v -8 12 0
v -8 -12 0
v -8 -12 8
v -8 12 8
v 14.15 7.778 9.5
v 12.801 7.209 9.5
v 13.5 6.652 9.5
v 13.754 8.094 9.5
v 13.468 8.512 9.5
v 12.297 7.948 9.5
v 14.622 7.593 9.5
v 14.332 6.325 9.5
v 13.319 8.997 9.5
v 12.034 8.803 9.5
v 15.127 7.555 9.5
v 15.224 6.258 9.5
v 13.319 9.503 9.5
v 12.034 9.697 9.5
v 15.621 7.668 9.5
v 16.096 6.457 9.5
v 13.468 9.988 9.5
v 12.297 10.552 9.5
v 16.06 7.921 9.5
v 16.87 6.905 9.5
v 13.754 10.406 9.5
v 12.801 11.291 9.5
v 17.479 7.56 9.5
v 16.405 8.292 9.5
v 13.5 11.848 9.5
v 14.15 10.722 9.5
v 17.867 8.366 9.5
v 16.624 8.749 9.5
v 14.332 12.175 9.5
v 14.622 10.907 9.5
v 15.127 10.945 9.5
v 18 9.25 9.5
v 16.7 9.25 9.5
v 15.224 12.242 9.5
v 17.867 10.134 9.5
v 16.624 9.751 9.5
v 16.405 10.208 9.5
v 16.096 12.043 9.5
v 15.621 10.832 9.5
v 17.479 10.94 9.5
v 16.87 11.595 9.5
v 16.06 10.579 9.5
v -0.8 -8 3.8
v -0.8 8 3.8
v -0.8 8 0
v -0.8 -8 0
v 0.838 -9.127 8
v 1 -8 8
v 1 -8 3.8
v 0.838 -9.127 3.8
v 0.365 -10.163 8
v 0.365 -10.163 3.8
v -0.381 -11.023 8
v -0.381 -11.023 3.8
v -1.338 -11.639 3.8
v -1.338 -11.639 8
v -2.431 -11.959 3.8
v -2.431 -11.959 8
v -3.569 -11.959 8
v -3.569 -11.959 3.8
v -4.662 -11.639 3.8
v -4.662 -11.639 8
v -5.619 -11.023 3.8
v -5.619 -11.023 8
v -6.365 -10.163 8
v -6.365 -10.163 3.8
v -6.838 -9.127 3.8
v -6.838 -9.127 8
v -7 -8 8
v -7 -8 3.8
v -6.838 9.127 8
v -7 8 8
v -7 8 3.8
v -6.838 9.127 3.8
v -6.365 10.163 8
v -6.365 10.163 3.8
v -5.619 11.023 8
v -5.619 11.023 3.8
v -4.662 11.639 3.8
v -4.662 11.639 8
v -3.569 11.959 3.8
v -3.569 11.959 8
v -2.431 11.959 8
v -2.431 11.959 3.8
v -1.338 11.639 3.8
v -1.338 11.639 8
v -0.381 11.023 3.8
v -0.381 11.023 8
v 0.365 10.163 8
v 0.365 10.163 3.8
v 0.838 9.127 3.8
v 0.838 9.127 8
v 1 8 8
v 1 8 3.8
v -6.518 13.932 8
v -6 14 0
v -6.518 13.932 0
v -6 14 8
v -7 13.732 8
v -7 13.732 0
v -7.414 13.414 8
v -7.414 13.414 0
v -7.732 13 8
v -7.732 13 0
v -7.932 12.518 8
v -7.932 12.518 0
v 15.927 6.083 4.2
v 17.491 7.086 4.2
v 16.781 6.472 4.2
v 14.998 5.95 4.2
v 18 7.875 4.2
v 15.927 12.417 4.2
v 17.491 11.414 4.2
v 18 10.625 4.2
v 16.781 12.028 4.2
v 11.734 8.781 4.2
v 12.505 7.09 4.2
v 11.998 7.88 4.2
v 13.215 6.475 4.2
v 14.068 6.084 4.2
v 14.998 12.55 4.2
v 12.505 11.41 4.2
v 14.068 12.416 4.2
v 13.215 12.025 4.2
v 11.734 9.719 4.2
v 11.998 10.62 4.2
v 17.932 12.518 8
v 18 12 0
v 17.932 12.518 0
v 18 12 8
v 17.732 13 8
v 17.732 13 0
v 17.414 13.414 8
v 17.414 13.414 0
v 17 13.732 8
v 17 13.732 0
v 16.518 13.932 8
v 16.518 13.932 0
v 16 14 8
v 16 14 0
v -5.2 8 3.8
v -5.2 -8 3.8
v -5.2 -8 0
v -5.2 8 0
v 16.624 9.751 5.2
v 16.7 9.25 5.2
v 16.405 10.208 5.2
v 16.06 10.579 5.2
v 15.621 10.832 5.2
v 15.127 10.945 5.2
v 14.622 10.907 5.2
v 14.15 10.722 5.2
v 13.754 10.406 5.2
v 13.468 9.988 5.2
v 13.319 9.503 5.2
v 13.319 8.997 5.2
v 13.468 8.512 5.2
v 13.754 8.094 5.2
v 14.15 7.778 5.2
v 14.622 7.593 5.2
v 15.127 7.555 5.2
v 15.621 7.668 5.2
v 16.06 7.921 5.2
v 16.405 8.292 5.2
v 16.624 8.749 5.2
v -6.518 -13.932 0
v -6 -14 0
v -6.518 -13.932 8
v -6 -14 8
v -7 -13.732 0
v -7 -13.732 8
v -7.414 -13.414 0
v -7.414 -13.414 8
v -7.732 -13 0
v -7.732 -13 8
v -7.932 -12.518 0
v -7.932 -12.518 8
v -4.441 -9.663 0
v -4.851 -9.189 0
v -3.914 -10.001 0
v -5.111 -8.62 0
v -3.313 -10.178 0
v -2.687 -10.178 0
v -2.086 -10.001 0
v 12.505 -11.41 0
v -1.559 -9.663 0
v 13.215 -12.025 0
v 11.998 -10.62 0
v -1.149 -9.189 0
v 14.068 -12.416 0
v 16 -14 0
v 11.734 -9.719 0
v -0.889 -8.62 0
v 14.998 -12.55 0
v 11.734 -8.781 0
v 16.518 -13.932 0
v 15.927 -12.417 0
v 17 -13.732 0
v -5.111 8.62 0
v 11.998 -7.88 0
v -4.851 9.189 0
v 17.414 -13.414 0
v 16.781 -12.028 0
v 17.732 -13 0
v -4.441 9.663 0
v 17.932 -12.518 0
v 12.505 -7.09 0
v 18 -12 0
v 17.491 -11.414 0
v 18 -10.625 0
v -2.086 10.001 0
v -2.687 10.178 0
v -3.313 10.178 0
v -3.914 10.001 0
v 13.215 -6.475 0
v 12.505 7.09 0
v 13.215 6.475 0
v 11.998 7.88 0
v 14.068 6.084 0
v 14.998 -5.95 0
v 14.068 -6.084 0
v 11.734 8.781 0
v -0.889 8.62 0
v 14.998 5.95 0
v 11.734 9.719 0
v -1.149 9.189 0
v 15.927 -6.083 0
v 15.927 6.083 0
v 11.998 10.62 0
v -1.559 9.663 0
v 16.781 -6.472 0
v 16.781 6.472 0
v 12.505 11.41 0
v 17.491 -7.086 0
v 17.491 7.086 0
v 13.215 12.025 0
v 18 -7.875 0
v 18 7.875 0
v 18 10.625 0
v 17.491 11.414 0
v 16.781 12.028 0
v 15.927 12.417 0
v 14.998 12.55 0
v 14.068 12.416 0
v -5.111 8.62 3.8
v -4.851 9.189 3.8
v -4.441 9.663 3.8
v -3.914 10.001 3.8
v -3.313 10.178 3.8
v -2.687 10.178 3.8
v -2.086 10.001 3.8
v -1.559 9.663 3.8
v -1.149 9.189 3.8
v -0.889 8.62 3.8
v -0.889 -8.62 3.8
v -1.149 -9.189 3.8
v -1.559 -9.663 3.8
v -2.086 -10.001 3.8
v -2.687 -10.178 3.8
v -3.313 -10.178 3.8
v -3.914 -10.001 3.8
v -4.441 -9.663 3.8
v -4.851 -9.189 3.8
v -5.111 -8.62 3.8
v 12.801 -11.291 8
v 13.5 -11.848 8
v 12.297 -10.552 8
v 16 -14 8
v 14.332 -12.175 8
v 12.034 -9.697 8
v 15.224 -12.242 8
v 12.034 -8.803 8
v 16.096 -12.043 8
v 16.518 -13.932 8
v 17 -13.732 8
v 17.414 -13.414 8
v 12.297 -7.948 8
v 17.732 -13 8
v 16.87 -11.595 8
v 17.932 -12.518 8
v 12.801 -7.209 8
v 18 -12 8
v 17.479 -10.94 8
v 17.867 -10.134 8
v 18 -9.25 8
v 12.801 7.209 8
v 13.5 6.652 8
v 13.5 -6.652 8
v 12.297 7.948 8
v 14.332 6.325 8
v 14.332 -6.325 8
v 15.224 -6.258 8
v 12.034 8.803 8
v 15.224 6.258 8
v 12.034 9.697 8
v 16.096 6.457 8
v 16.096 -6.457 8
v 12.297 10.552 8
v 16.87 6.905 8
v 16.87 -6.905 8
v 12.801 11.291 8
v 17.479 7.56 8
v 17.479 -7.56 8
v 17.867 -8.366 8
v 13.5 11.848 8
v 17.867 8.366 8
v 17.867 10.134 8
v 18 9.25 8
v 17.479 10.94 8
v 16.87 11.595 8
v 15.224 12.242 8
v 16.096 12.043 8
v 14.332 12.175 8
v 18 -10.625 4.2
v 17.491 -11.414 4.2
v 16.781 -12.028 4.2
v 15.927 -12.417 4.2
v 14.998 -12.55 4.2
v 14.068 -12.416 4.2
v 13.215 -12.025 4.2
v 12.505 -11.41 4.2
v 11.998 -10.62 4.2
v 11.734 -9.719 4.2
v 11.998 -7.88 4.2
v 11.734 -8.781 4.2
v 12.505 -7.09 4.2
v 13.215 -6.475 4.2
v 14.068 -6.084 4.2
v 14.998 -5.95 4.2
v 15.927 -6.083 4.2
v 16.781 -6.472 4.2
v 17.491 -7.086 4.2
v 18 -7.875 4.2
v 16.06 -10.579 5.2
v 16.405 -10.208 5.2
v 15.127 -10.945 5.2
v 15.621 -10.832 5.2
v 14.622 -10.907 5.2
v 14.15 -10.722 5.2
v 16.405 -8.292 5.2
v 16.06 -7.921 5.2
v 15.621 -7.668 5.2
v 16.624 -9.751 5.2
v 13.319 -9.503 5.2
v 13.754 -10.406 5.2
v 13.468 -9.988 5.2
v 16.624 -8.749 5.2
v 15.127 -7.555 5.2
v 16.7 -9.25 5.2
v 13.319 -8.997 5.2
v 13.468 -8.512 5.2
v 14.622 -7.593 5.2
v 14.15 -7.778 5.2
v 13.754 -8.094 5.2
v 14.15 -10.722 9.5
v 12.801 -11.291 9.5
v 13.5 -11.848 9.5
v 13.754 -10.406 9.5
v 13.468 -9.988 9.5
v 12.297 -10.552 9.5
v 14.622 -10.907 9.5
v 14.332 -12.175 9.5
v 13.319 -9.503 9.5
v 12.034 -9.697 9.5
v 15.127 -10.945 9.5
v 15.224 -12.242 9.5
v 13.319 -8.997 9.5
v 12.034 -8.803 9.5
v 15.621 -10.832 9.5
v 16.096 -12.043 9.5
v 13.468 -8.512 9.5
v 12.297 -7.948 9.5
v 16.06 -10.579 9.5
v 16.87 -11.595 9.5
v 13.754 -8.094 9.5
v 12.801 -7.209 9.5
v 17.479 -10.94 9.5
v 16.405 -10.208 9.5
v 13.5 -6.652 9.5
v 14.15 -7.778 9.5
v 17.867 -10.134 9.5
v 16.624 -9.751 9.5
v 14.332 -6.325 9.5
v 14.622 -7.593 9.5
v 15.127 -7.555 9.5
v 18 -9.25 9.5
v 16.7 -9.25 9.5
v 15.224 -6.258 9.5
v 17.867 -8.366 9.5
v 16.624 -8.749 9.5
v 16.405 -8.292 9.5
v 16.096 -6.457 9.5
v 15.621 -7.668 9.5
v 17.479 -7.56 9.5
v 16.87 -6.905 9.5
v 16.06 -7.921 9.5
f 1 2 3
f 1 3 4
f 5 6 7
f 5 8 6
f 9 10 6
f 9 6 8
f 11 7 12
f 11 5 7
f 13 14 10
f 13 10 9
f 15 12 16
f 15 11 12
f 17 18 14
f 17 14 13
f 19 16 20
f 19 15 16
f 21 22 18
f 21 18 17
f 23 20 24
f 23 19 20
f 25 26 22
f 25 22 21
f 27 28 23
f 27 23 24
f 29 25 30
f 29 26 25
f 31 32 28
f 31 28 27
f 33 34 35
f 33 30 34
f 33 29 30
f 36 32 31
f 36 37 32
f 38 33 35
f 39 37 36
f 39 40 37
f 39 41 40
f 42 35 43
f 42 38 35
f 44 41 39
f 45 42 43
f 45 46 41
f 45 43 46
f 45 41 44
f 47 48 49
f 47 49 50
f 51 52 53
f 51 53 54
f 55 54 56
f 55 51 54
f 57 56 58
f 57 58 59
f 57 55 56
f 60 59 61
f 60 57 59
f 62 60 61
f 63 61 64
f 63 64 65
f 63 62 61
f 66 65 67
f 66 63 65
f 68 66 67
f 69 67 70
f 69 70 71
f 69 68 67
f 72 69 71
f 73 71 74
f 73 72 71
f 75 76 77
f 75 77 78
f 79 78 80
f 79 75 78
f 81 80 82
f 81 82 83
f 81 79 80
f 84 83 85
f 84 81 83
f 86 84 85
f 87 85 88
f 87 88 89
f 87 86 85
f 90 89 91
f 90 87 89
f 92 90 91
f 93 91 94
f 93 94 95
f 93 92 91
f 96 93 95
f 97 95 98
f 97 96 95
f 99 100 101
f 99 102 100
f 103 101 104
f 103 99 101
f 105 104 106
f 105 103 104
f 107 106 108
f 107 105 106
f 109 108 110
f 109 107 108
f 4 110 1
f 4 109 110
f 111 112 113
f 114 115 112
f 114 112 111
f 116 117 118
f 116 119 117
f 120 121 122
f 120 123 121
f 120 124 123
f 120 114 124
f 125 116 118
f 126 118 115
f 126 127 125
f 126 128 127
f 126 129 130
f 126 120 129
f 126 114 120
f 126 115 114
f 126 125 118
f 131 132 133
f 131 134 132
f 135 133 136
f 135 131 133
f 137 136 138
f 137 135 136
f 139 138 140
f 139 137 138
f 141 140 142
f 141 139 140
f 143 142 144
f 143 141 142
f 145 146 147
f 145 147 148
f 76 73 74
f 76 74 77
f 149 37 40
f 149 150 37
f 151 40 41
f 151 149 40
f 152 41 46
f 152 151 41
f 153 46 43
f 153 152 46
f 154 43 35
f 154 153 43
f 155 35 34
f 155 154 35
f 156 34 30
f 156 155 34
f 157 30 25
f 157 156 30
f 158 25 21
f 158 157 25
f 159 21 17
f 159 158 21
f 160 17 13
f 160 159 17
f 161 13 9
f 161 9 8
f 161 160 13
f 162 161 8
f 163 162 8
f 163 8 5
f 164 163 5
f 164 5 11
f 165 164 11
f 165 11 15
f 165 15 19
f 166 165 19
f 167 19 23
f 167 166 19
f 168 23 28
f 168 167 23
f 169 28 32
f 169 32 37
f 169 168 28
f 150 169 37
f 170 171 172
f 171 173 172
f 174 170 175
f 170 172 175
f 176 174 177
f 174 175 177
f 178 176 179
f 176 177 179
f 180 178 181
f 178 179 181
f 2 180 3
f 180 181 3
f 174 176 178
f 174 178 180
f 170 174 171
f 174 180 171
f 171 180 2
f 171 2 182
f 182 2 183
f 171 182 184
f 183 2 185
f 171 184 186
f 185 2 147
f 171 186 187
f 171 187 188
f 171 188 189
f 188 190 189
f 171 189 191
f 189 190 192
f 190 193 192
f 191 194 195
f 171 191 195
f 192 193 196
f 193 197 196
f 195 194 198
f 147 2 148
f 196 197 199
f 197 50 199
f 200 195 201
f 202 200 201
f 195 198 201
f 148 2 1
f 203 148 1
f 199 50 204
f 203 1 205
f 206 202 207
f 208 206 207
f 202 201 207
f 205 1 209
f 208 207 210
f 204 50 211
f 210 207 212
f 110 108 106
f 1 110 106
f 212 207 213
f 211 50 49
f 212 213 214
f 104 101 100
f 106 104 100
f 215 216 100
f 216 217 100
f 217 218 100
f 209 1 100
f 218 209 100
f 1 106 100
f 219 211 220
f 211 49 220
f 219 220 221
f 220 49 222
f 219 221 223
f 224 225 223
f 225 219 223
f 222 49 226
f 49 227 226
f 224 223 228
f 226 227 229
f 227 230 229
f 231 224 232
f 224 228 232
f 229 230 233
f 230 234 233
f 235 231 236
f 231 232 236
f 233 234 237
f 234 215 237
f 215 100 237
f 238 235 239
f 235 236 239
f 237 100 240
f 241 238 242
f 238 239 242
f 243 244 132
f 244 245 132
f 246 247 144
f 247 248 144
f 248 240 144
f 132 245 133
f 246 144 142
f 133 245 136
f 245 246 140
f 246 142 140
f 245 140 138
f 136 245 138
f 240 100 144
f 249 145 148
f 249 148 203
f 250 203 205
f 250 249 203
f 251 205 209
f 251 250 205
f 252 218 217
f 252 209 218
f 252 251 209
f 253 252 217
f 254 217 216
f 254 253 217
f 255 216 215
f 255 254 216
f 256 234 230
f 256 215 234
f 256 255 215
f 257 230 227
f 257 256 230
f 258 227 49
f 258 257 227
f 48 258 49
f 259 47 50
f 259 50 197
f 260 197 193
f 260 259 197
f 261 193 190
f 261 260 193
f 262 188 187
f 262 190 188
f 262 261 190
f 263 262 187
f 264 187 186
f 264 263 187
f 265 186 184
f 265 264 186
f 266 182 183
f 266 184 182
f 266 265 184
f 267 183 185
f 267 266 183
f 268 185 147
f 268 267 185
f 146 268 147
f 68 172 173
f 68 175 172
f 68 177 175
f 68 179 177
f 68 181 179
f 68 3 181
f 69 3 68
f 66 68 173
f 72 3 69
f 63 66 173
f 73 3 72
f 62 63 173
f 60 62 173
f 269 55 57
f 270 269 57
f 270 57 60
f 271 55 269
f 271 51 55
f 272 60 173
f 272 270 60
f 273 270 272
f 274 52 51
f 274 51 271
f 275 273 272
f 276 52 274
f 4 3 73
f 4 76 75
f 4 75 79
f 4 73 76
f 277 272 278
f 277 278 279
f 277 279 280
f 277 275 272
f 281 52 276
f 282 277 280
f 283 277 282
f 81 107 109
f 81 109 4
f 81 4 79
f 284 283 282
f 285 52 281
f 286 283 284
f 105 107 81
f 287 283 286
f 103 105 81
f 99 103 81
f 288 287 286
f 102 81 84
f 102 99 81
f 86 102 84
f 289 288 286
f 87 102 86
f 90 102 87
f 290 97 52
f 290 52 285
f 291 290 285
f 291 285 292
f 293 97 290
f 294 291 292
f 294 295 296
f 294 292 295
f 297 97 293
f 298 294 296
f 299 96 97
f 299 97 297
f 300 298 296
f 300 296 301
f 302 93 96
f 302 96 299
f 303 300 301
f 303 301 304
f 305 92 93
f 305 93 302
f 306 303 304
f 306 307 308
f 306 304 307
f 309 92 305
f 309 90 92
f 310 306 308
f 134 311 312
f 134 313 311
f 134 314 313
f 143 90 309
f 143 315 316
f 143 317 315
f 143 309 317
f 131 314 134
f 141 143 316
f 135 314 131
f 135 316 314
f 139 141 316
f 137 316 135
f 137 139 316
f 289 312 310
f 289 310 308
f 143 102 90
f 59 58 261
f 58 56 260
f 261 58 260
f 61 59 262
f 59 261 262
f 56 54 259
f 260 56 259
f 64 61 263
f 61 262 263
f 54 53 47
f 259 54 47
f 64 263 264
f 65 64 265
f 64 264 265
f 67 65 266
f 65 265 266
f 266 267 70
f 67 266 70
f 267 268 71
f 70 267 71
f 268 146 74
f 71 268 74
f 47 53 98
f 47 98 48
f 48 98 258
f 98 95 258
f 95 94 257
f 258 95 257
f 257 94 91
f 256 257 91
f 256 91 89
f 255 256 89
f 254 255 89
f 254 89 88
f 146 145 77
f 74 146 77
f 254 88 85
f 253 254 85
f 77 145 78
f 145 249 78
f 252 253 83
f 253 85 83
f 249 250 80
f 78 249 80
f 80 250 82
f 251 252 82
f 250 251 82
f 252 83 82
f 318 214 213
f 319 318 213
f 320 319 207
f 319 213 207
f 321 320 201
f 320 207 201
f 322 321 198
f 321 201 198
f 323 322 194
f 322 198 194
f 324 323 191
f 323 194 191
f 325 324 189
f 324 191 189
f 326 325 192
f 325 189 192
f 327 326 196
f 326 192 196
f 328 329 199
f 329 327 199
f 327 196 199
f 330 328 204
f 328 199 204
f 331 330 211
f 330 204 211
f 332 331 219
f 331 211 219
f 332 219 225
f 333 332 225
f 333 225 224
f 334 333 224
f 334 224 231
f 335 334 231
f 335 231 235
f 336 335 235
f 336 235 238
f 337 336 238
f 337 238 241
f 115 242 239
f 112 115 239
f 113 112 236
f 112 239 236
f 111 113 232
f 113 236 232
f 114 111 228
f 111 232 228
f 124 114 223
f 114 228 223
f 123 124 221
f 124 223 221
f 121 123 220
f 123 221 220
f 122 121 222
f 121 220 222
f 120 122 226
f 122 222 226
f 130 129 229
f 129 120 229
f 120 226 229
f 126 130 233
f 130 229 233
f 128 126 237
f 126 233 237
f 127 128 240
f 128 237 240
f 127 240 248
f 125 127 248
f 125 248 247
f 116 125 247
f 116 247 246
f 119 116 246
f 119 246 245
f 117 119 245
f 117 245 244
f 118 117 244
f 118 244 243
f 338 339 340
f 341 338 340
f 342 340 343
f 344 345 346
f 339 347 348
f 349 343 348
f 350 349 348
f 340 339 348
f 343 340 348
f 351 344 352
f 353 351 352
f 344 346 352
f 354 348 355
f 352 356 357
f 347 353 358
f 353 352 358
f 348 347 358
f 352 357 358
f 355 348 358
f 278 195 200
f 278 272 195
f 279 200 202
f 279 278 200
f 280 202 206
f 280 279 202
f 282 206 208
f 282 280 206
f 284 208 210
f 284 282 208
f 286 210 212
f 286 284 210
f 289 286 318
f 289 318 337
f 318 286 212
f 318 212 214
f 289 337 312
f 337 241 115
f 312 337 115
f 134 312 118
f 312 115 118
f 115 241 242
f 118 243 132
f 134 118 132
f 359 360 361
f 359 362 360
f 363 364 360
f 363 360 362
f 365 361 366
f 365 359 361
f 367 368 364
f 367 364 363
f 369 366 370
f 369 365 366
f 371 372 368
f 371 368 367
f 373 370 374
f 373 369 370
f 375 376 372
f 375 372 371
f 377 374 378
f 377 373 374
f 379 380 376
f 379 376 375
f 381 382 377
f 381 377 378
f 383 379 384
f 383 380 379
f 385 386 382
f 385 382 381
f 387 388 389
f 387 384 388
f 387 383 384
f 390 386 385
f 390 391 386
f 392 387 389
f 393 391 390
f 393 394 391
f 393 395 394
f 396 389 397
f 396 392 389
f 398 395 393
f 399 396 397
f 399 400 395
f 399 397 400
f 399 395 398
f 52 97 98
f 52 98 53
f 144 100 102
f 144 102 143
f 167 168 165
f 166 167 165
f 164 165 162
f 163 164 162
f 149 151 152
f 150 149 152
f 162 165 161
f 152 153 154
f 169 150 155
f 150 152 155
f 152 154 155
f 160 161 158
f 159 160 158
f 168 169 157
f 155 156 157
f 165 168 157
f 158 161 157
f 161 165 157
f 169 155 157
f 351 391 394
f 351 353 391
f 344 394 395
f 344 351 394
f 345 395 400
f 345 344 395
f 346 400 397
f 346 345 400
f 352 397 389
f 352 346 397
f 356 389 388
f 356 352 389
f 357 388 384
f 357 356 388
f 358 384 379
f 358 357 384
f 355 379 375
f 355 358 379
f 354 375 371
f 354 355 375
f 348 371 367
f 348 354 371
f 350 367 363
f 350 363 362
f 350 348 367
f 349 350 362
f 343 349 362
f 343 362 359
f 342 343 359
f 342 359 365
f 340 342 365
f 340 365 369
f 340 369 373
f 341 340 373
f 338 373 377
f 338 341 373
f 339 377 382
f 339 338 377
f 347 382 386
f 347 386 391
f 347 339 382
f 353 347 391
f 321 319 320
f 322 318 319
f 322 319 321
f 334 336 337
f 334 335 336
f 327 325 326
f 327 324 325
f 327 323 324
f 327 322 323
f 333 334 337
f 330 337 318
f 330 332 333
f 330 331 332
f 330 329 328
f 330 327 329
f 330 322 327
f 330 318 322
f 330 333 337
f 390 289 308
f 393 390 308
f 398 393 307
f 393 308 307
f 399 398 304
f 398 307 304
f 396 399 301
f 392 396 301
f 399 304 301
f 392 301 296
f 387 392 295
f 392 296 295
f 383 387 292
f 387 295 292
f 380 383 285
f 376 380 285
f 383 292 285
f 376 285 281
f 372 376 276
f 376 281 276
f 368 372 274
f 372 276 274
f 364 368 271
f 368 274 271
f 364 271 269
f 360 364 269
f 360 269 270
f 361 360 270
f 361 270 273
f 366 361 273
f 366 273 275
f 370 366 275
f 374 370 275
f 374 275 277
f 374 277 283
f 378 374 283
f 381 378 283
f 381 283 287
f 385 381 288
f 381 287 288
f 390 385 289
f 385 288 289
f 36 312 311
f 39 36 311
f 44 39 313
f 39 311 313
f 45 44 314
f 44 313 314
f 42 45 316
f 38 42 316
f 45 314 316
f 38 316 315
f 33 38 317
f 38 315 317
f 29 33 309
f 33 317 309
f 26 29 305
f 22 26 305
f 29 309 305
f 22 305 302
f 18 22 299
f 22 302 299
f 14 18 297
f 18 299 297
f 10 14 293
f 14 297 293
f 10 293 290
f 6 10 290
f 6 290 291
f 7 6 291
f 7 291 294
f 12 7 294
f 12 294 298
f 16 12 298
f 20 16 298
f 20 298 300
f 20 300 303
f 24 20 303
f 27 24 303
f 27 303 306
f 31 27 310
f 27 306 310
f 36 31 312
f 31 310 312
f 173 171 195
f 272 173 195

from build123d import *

# Parameters (mm, degrees)
ESQUISSE1_W             = 26
ESQUISSE1_H             = 28
BOSS_EXTRU_1_DEPTH      = 8
ENL_V_MAT_EXTRU_1_DEPTH = 9
ENL_V_MAT_EXTRU_2_DEPTH = 4.2
ESQUISSE4_R             = 1.7
ENL_V_MAT_EXTRU_3_DEPTH = 9
ESQUISSE5_R             = 3.3
ENL_V_MAT_EXTRU_6_DEPTH = 4.2
ESQUISSE6_R             = 1.7
BOSS_EXTRU_2_DEPTH      = 1
ESQUISSE7_R             = 3
ESQUISSE7_R_2           = 1.7
BOSS_EXTRU_3_DEPTH      = 1.5
FILLET1_R               = 2


with BuildPart() as part:
    # Esquisse1 → Boss.-Extru.1 (new body)
    with BuildSketch(Plane.XY):
        with Locations((5, 0)):
            Rectangle(ESQUISSE1_W, ESQUISSE1_H)
    extrude(amount=BOSS_EXTRU_1_DEPTH)

    # Esquisse2 → Enlèv. mat.-Extru.1 (cut, through all)
    with BuildSketch(Plane.XY.offset(8)):
        with BuildLine():
            Line((-0.8, 8), (-0.8, -8))
            ThreePointArc((-0.8, -8), (-3, -10.2), (-5.2, -8))
            Line((-5.2, -8), (-5.2, 8))
            ThreePointArc((-5.2, 8), (-3, 10.2), (-0.8, 8))
        make_face()
    extrude(amount=-ENL_V_MAT_EXTRU_1_DEPTH, mode=Mode.SUBTRACT)

    # Esquisse3 → Enlèv. mat.-Extru.2 (cut)
    with BuildSketch(Plane.XY.offset(8)):
        with BuildLine():
            Line((1, 8), (1, -8))
            ThreePointArc((1, -8), (-3, -12), (-7, -8))
            Line((-7, -8), (-7, 8))
            ThreePointArc((-7, 8), (-3, 12), (1, 8))
        make_face()
    extrude(amount=-ENL_V_MAT_EXTRU_2_DEPTH, mode=Mode.SUBTRACT)

    # Esquisse4 → Enlèv. mat.-Extru.3 (cut, through all)
    with BuildSketch(Plane.XY.offset(8)):
        with Locations((15, 9.25)):
            Circle(ESQUISSE4_R)
        with Locations((15, -9.25)):
            Circle(ESQUISSE4_R)
    extrude(amount=-ENL_V_MAT_EXTRU_3_DEPTH, mode=Mode.SUBTRACT)

    # Esquisse5 → Enlèv. mat.-Extru.6 (cut)
    with BuildSketch(Plane(origin=(0, 0, 0), x_dir=(-1, 0, 0), z_dir=(0, 0, -1))):
        with Locations((-15, 9.25)):
            Circle(ESQUISSE5_R)
        with Locations((-15, -9.25)):
            Circle(ESQUISSE5_R)
    extrude(amount=-ENL_V_MAT_EXTRU_6_DEPTH, mode=Mode.SUBTRACT)

    # Esquisse6 → Boss.-Extru.2 (add)
    with BuildSketch(Plane(origin=(0, 0, 4.2), x_dir=(-1, 0, 0), z_dir=(0, 0, -1))):
        with Locations((-15, 9.25)):
            Circle(ESQUISSE6_R)
        with Locations((-15, -9.25)):
            Circle(ESQUISSE6_R)
    extrude(amount=-BOSS_EXTRU_2_DEPTH)

    # Esquisse7 → Boss.-Extru.3 (add)
    with BuildSketch(Plane.XY.offset(8)):
        with Locations((15, -9.25)):
            Circle(ESQUISSE7_R)
        with Locations((15, -9.25)):
            Circle(ESQUISSE7_R_2, mode=Mode.SUBTRACT)
        with Locations((15, 9.25)):
            Circle(ESQUISSE7_R)
        with Locations((15, 9.25)):
            Circle(ESQUISSE7_R_2, mode=Mode.SUBTRACT)
    extrude(amount=BOSS_EXTRU_3_DEPTH)

    # Fillet1
    fillet1_edges = [part.edges().sort_by_distance(p)[0] for p in [
        (-8, 14, 4),
        (18, 14, 4),
        (18, -14, 4),
        (-8, -14, 4),
    ]]
    fillet(fillet1_edges, radius=FILLET1_R)


solid = part.part
